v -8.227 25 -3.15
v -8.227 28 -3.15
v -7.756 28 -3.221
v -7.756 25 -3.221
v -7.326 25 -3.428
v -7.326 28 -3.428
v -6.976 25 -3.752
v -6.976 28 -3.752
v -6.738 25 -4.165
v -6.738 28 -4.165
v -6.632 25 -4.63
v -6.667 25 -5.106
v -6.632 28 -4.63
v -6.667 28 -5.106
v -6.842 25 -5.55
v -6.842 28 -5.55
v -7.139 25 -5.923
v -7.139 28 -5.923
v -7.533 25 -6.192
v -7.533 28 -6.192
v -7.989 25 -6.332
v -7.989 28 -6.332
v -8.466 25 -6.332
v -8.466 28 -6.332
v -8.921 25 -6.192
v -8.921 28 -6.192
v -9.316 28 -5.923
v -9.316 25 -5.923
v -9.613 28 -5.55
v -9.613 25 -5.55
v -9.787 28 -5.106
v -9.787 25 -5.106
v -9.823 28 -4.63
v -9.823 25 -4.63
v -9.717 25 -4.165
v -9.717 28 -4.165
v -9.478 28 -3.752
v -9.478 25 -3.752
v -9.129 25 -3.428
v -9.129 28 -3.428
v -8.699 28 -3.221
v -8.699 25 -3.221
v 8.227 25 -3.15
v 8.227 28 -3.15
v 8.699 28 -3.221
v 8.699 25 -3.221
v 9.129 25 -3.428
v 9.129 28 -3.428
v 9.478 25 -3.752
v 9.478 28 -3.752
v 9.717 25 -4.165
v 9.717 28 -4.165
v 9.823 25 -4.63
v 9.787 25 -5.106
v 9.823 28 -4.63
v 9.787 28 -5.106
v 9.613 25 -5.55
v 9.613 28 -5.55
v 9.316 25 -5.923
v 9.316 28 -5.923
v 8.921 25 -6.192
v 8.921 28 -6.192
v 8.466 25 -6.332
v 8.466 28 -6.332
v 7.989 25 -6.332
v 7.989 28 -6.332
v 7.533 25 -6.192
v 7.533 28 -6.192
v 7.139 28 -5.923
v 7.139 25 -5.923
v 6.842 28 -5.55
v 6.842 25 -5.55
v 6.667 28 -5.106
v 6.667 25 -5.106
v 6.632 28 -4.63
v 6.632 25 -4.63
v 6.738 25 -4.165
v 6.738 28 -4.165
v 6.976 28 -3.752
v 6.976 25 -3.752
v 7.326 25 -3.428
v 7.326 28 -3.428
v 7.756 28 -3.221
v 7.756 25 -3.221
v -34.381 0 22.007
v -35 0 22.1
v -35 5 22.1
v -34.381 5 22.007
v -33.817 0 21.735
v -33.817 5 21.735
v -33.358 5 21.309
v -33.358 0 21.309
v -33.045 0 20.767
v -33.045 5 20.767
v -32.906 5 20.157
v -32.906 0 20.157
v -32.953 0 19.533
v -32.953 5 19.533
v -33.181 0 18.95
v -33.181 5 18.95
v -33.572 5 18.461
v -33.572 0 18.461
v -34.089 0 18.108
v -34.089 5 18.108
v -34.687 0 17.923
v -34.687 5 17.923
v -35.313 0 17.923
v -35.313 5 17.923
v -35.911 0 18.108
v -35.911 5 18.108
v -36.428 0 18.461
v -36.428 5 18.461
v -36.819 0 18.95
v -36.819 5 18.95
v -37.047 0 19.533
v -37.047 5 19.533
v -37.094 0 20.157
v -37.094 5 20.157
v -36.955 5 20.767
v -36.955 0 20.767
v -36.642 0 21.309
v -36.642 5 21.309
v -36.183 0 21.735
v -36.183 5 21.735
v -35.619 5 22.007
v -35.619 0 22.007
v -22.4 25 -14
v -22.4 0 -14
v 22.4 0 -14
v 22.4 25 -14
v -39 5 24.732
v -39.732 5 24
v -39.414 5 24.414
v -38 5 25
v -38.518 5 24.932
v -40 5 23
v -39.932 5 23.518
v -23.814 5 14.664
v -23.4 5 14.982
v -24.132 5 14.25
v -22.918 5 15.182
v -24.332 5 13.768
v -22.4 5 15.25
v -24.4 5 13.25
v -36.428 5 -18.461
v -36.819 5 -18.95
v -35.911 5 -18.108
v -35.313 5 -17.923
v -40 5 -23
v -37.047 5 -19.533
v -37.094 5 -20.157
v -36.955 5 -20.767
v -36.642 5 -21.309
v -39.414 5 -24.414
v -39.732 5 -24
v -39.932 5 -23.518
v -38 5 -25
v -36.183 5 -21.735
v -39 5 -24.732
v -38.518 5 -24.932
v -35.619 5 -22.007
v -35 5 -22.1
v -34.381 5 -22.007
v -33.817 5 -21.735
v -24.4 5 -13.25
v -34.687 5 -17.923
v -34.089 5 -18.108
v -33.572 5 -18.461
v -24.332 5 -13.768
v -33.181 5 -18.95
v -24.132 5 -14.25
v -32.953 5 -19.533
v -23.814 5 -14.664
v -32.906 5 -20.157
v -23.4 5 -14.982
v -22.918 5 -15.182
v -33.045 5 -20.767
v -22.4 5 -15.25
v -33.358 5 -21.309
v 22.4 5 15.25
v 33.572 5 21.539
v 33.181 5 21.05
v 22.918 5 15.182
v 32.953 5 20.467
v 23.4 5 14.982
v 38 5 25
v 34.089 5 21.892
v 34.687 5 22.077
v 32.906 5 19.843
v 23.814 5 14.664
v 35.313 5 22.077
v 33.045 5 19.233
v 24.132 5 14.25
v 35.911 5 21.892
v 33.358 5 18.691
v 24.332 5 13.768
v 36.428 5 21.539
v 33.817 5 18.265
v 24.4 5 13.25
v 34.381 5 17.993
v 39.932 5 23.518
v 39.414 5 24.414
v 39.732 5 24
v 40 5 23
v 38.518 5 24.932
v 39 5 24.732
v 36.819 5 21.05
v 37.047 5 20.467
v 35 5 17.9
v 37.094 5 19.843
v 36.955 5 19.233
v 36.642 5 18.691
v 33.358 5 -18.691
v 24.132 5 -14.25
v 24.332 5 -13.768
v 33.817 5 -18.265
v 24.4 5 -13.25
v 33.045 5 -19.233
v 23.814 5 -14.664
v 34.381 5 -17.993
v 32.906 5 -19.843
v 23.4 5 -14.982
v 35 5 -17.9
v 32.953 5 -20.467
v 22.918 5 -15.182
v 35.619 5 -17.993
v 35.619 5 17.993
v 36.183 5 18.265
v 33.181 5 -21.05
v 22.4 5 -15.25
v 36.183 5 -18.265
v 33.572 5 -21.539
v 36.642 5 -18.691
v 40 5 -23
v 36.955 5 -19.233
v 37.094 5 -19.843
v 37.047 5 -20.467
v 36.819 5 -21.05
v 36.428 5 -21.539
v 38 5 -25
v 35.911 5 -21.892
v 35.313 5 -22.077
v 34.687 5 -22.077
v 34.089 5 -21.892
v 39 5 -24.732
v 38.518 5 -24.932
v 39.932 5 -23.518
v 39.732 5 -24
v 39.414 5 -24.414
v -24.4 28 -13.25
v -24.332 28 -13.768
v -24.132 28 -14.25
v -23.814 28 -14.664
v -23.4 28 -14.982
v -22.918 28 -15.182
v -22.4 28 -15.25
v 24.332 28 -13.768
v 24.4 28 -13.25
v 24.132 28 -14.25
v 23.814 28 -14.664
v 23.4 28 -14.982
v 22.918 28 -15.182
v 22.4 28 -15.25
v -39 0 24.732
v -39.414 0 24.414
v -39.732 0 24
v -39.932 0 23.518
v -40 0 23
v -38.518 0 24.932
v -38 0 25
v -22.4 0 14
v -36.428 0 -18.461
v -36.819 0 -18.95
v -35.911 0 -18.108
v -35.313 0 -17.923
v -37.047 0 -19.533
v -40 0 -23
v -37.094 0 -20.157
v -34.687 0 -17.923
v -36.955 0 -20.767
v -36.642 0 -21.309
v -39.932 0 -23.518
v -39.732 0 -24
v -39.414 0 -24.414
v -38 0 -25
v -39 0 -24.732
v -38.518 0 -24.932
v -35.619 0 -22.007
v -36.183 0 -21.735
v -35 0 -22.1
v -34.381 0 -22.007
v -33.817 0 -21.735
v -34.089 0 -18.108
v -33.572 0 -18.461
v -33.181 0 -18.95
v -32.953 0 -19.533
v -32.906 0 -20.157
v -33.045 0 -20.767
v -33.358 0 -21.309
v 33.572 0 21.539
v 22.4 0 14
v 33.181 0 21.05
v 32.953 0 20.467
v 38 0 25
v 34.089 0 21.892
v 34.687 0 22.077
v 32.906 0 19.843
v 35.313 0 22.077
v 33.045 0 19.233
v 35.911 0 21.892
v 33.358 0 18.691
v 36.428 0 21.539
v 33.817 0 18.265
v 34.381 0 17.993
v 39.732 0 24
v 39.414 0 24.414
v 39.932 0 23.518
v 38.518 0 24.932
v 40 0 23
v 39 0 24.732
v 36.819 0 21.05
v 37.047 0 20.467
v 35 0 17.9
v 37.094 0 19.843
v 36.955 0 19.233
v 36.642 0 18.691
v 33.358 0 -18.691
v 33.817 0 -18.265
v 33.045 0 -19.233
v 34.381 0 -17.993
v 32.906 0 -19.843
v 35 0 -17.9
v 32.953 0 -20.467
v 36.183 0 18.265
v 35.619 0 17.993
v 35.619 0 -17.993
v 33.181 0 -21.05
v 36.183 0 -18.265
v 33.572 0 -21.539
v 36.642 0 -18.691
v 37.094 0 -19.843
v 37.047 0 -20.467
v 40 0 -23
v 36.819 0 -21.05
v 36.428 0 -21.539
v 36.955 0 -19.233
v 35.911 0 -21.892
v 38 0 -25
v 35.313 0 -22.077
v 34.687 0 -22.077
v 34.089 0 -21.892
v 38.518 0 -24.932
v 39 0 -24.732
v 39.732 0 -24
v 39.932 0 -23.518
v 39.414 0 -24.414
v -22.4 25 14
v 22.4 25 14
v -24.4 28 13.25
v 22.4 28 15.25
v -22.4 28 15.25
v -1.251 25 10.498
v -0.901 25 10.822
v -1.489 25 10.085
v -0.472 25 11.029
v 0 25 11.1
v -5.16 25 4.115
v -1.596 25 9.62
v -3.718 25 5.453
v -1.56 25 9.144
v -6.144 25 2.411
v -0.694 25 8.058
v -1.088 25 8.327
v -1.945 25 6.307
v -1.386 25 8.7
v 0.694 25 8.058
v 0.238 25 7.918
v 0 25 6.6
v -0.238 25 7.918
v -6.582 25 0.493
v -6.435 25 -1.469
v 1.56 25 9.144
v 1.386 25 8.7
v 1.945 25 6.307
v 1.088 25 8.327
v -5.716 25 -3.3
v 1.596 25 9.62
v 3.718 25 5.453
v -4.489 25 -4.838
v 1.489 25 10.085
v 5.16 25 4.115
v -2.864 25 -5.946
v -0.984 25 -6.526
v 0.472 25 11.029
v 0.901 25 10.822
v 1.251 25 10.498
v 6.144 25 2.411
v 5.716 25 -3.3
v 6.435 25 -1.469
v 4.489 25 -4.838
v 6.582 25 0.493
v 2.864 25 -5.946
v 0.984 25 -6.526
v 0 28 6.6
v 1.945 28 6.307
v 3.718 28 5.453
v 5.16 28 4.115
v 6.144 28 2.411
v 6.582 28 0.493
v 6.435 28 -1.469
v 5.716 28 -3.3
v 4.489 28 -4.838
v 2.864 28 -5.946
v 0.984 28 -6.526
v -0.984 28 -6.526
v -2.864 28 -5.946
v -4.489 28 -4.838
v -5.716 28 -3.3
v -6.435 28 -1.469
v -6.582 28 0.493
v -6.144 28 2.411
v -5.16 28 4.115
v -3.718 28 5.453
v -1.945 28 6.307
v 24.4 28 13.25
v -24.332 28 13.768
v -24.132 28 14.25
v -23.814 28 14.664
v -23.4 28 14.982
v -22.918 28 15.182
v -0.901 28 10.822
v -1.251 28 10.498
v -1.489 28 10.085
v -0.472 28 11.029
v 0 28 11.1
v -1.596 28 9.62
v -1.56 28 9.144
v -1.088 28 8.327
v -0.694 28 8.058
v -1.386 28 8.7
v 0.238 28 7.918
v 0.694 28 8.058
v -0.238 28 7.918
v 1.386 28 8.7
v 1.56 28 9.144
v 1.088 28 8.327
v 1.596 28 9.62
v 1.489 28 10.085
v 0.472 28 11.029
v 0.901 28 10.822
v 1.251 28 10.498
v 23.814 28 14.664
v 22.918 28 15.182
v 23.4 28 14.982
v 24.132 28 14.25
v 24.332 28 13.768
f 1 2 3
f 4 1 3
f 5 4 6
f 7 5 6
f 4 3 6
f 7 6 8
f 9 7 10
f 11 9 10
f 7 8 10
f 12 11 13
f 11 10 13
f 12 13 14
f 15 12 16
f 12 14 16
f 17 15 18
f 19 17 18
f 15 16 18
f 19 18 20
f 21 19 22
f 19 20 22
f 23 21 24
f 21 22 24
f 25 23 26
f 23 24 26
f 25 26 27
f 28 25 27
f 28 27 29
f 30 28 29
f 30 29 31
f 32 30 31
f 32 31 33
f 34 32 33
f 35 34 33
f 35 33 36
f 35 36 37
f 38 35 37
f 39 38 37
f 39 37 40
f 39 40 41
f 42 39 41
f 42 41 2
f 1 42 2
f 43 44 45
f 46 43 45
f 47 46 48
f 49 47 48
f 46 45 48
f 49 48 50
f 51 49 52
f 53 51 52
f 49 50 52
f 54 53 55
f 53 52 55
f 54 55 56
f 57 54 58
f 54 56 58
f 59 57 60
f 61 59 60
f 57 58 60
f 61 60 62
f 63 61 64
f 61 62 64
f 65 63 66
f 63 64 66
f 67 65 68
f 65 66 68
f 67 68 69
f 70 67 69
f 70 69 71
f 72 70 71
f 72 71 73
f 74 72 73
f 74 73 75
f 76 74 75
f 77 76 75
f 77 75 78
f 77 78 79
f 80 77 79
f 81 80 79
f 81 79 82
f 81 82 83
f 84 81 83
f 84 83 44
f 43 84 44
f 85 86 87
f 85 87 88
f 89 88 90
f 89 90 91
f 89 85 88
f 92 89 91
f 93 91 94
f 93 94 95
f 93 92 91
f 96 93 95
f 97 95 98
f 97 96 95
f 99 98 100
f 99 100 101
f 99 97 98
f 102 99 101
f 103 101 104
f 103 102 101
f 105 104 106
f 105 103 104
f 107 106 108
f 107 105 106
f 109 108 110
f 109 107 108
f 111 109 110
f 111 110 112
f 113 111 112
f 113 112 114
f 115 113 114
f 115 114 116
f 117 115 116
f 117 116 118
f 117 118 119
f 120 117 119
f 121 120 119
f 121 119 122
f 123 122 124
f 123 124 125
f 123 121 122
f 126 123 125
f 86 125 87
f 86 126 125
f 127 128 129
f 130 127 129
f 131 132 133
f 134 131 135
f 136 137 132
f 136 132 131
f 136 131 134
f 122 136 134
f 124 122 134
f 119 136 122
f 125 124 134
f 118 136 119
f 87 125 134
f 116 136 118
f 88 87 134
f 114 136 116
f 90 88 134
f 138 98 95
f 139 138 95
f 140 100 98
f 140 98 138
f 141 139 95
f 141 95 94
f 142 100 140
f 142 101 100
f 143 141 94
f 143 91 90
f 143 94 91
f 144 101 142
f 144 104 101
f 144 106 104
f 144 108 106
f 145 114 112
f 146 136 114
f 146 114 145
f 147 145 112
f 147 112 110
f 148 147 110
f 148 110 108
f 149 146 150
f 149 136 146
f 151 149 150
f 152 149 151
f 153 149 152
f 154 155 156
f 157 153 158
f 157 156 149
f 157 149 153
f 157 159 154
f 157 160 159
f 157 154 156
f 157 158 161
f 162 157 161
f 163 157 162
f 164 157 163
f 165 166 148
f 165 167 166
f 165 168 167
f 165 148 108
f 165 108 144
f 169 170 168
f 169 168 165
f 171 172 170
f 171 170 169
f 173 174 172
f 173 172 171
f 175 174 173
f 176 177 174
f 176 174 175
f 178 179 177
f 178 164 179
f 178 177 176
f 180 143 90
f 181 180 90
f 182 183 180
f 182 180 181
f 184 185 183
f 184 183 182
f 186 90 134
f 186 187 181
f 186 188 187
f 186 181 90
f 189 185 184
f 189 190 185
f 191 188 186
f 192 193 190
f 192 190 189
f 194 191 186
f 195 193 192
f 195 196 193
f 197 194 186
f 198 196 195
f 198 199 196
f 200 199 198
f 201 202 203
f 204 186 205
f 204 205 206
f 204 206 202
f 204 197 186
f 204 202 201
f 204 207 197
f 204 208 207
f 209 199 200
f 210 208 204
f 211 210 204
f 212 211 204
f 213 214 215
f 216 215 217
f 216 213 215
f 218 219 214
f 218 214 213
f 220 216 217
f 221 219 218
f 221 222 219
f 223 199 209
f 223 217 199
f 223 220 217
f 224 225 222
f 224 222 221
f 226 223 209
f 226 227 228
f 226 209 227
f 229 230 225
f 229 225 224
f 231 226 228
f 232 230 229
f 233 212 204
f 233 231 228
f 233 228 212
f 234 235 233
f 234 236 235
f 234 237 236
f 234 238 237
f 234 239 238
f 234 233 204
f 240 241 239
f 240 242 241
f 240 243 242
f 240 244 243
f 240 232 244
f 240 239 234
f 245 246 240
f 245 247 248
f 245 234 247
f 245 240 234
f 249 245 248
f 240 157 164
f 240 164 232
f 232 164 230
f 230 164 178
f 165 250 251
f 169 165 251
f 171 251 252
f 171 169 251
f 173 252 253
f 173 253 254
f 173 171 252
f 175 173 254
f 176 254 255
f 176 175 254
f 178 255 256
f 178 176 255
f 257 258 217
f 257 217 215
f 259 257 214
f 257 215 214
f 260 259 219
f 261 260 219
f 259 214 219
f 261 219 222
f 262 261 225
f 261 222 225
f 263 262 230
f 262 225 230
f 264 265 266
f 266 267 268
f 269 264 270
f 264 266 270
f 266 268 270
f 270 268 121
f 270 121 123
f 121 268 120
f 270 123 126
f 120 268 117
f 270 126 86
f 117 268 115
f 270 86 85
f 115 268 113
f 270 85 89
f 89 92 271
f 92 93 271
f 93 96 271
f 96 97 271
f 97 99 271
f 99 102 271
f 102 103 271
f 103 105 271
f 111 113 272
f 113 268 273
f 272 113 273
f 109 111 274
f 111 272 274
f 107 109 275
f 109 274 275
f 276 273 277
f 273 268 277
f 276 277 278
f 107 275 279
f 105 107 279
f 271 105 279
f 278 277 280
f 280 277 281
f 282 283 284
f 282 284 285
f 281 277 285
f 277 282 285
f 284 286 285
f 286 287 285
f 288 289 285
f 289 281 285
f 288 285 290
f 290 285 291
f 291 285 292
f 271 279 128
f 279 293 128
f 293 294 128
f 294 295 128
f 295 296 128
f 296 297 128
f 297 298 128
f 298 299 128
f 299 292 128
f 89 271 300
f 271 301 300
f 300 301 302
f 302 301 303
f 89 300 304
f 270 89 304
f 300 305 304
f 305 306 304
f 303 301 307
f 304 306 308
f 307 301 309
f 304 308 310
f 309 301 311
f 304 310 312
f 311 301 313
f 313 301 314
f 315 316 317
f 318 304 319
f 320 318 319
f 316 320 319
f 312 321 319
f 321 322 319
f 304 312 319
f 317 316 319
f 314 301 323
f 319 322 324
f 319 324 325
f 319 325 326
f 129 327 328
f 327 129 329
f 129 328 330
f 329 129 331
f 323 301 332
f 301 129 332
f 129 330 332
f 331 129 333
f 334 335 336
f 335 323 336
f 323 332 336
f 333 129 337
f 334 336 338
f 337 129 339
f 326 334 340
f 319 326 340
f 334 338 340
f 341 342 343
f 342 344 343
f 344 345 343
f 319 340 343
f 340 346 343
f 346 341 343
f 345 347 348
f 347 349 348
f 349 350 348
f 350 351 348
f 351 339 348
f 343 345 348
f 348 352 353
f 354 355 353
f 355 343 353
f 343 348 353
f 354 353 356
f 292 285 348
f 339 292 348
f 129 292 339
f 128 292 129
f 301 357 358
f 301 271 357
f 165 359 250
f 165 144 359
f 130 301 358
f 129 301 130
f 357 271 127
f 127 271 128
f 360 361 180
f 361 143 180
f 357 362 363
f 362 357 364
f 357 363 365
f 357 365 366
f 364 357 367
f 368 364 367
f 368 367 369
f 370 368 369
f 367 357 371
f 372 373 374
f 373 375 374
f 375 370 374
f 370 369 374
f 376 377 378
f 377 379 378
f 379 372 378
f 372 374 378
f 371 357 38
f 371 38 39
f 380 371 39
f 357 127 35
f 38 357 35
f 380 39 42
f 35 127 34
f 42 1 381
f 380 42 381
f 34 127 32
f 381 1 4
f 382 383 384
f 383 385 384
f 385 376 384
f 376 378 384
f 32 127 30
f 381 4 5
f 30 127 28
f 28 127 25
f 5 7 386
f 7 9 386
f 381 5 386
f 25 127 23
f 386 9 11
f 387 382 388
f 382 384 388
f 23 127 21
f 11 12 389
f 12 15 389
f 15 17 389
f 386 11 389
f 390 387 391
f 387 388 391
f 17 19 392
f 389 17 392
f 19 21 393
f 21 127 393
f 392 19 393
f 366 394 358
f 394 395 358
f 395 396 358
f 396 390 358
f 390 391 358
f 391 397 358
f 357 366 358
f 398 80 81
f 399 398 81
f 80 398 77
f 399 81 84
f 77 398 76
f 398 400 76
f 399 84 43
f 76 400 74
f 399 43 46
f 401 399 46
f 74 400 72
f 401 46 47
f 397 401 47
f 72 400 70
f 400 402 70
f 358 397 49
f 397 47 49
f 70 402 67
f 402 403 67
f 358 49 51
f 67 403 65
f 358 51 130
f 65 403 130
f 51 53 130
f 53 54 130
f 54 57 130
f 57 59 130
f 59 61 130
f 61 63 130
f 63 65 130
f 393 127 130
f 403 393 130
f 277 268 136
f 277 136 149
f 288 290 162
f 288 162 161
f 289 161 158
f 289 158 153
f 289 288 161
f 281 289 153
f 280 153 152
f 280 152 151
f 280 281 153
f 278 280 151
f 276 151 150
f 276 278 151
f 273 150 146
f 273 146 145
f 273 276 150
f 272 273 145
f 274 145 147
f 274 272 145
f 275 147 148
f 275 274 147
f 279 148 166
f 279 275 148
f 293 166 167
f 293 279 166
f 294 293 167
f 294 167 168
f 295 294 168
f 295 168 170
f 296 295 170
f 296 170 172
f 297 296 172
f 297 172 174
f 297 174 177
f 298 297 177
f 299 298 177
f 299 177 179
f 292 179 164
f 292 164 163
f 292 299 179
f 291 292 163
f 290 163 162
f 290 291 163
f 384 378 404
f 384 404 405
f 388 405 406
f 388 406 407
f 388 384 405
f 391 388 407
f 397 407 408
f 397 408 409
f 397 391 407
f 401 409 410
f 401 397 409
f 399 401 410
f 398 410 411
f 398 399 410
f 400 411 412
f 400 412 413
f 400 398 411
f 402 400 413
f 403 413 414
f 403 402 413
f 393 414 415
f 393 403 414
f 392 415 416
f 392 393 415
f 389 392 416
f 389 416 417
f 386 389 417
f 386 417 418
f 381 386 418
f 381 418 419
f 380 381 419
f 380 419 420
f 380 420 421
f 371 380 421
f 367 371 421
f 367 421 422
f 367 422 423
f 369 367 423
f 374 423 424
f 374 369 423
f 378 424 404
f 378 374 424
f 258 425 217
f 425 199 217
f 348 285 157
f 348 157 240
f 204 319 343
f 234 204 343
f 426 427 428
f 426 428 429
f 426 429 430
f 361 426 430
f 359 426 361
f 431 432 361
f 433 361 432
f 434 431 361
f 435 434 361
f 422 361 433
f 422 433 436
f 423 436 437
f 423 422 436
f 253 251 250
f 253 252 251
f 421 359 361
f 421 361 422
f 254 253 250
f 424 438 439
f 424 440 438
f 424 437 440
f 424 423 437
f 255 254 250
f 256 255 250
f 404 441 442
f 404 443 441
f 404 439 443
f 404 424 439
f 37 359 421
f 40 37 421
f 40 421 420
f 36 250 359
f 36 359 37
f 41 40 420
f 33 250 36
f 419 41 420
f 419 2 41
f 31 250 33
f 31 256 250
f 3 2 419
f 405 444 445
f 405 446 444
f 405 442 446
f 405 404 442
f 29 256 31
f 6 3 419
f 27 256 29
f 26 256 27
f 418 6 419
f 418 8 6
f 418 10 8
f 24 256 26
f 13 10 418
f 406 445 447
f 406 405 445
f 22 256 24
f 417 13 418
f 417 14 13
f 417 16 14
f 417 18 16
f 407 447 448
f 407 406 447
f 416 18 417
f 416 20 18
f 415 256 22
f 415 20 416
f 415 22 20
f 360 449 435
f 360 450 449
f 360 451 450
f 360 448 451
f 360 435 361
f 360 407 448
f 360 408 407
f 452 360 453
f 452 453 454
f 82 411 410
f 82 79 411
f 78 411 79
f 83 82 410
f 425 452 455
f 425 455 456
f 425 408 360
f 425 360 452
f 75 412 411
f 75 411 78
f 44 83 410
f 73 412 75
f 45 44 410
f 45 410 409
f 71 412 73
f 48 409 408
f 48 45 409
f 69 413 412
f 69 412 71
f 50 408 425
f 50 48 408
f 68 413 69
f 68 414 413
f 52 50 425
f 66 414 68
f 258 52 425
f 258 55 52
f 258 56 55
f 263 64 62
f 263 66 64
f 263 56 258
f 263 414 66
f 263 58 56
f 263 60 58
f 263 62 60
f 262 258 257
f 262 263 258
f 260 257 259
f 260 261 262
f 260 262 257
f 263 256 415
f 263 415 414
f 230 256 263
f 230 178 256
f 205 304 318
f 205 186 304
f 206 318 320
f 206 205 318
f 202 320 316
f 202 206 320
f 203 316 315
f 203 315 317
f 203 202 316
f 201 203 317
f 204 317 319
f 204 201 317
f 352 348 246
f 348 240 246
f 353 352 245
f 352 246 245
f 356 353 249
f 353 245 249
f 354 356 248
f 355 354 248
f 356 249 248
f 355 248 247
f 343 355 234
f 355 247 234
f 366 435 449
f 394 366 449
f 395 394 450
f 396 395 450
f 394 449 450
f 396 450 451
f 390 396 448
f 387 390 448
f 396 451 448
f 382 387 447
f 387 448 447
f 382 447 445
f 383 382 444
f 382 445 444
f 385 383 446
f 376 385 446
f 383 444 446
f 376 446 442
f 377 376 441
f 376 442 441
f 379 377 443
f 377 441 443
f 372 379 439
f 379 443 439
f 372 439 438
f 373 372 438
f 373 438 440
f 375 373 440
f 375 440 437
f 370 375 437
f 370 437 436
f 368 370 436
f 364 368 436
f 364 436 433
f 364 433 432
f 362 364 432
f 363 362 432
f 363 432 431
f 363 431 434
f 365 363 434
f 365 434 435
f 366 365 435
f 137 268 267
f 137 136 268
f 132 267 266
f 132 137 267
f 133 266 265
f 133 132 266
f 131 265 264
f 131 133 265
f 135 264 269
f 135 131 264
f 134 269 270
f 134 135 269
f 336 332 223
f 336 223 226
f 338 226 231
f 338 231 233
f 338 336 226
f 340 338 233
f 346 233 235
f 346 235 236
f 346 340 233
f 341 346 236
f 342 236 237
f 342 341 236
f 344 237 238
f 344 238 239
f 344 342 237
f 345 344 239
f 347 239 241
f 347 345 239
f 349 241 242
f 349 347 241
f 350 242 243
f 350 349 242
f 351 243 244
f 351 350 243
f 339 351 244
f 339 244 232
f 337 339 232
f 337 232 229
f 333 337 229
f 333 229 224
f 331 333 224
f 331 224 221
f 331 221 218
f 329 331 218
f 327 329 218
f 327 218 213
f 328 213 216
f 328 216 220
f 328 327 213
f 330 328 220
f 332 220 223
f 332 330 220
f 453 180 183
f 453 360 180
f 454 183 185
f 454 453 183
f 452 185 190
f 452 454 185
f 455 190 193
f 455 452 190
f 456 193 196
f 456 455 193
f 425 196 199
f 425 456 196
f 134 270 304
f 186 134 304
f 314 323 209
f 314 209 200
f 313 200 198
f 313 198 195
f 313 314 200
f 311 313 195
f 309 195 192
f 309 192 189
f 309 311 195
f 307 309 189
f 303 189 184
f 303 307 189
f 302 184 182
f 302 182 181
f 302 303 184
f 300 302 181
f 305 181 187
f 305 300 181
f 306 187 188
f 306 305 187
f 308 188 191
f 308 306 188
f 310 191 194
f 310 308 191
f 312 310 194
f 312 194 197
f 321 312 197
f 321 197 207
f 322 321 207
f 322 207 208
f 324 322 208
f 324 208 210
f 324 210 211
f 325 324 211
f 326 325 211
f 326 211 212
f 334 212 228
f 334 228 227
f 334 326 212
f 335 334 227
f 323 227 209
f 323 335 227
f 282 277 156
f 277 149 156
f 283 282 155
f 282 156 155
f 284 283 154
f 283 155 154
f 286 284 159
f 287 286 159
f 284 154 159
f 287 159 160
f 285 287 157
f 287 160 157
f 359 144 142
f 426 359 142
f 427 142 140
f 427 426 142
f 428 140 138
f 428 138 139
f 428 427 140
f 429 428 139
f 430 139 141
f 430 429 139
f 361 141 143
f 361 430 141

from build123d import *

# Parameters (mm, degrees)
SKETCH_1_W          = 80
SKETCH_1_H          = 50
SKETCH_1_R          = 2.1
SKETCH_1_W_2        = 44.8
SKETCH_1_H_2        = 28
EXTRUDE_1_DEPTH     = 5
FILLET_1_R          = 2
SKETCH_2_W          = 48.8
SKETCH_2_H          = 30.5
SKETCH_2_W_2        = 44.8
SKETCH_2_H_2        = 28
EXTRUDE_2_DEPTH     = 20
SKETCH_3_W          = 48.8
SKETCH_3_H          = 30.5
SKETCH_3_R          = 6.6
EXTRUDE_3_DEPTH     = 3
FILLET_2_R          = 2
SKETCH_4_R          = 1.6
CUT_EXTRUDE_1_DEPTH = 55.854352608


with BuildPart() as part:
    # 草图1 → 凸台-拉伸1 (new body)
    with BuildSketch(Plane(origin=(0, 0, 0), x_dir=(1, 0, 0), z_dir=(0, 1, 0))):
        Rectangle(SKETCH_1_W, SKETCH_1_H)
        with Locations(Location((35, 20, 0), (0, 0, 270))):
            Circle(SKETCH_1_R, mode=Mode.SUBTRACT)
        with Locations(Location((35, -20, 0), (0, 0, 90))):
            Circle(SKETCH_1_R, mode=Mode.SUBTRACT)
        with Locations(Location((-35, -20, 0), (0, 0, 270))):
            Circle(SKETCH_1_R, mode=Mode.SUBTRACT)
        with Locations(Location((-35, 20, 0), (0, 0, 90))):
            Circle(SKETCH_1_R, mode=Mode.SUBTRACT)
        Rectangle(SKETCH_1_W_2, SKETCH_1_H_2, mode=Mode.SUBTRACT)
    extrude(amount=EXTRUDE_1_DEPTH)

    # 圆角1
    fillet_1_edges = [part.edges().sort_by_distance(p)[0] for p in [
        (40, 2.5, 25),
        (-40, 2.5, 25),
        (-40, 2.5, -25),
        (40, 2.5, -25),
    ]]
    fillet(fillet_1_edges, radius=FILLET_1_R)

    # 草图2 → 凸台-拉伸2 (add)
    with BuildSketch(Plane(origin=(0, 5, 0), x_dir=(1, 0, 0), z_dir=(0, 1, 0))):
        Rectangle(SKETCH_2_W, SKETCH_2_H)
        Rectangle(SKETCH_2_W_2, SKETCH_2_H_2, mode=Mode.SUBTRACT)
    extrude(amount=EXTRUDE_2_DEPTH)

    # 草图3 → 凸台-拉伸3 (add)
    with BuildSketch(Plane(origin=(0, 25, 0), x_dir=(1, 0, 0), z_dir=(0, 1, 0))):
        Rectangle(SKETCH_3_W, SKETCH_3_H)
        with Locations(Location((0, 0, 0), (0, 0, 270))):
            Circle(SKETCH_3_R, mode=Mode.SUBTRACT)
    extrude(amount=EXTRUDE_3_DEPTH)

    # 圆角2
    fillet_2_edges = [part.edges().sort_by_distance(p)[0] for p in [
        (24.4, 16.5, 15.25),
        (24.4, 16.5, -15.25),
        (-24.4, 16.5, -15.25),
        (-24.4, 16.5, 15.25),
    ]]
    fillet(fillet_2_edges, radius=FILLET_2_R)

    # 草图4 → 切除-拉伸1 (cut, through all)
    with BuildSketch(Plane(origin=(0, 28, 0), x_dir=(1, 0, 0), z_dir=(0, 1, 0))):
        with Locations(Location((0, -9.5, 0), (0, 0, 270))):
            Circle(SKETCH_4_R)
        with Locations(Location((-8.227241336, 4.75, 0), (0, 0, 270))):
            Circle(SKETCH_4_R)
        with Locations(Location((8.227241336, 4.75, 0), (0, 0, 270))):
            Circle(SKETCH_4_R)
    extrude(amount=-CUT_EXTRUDE_1_DEPTH, mode=Mode.SUBTRACT)


solid = part.part
